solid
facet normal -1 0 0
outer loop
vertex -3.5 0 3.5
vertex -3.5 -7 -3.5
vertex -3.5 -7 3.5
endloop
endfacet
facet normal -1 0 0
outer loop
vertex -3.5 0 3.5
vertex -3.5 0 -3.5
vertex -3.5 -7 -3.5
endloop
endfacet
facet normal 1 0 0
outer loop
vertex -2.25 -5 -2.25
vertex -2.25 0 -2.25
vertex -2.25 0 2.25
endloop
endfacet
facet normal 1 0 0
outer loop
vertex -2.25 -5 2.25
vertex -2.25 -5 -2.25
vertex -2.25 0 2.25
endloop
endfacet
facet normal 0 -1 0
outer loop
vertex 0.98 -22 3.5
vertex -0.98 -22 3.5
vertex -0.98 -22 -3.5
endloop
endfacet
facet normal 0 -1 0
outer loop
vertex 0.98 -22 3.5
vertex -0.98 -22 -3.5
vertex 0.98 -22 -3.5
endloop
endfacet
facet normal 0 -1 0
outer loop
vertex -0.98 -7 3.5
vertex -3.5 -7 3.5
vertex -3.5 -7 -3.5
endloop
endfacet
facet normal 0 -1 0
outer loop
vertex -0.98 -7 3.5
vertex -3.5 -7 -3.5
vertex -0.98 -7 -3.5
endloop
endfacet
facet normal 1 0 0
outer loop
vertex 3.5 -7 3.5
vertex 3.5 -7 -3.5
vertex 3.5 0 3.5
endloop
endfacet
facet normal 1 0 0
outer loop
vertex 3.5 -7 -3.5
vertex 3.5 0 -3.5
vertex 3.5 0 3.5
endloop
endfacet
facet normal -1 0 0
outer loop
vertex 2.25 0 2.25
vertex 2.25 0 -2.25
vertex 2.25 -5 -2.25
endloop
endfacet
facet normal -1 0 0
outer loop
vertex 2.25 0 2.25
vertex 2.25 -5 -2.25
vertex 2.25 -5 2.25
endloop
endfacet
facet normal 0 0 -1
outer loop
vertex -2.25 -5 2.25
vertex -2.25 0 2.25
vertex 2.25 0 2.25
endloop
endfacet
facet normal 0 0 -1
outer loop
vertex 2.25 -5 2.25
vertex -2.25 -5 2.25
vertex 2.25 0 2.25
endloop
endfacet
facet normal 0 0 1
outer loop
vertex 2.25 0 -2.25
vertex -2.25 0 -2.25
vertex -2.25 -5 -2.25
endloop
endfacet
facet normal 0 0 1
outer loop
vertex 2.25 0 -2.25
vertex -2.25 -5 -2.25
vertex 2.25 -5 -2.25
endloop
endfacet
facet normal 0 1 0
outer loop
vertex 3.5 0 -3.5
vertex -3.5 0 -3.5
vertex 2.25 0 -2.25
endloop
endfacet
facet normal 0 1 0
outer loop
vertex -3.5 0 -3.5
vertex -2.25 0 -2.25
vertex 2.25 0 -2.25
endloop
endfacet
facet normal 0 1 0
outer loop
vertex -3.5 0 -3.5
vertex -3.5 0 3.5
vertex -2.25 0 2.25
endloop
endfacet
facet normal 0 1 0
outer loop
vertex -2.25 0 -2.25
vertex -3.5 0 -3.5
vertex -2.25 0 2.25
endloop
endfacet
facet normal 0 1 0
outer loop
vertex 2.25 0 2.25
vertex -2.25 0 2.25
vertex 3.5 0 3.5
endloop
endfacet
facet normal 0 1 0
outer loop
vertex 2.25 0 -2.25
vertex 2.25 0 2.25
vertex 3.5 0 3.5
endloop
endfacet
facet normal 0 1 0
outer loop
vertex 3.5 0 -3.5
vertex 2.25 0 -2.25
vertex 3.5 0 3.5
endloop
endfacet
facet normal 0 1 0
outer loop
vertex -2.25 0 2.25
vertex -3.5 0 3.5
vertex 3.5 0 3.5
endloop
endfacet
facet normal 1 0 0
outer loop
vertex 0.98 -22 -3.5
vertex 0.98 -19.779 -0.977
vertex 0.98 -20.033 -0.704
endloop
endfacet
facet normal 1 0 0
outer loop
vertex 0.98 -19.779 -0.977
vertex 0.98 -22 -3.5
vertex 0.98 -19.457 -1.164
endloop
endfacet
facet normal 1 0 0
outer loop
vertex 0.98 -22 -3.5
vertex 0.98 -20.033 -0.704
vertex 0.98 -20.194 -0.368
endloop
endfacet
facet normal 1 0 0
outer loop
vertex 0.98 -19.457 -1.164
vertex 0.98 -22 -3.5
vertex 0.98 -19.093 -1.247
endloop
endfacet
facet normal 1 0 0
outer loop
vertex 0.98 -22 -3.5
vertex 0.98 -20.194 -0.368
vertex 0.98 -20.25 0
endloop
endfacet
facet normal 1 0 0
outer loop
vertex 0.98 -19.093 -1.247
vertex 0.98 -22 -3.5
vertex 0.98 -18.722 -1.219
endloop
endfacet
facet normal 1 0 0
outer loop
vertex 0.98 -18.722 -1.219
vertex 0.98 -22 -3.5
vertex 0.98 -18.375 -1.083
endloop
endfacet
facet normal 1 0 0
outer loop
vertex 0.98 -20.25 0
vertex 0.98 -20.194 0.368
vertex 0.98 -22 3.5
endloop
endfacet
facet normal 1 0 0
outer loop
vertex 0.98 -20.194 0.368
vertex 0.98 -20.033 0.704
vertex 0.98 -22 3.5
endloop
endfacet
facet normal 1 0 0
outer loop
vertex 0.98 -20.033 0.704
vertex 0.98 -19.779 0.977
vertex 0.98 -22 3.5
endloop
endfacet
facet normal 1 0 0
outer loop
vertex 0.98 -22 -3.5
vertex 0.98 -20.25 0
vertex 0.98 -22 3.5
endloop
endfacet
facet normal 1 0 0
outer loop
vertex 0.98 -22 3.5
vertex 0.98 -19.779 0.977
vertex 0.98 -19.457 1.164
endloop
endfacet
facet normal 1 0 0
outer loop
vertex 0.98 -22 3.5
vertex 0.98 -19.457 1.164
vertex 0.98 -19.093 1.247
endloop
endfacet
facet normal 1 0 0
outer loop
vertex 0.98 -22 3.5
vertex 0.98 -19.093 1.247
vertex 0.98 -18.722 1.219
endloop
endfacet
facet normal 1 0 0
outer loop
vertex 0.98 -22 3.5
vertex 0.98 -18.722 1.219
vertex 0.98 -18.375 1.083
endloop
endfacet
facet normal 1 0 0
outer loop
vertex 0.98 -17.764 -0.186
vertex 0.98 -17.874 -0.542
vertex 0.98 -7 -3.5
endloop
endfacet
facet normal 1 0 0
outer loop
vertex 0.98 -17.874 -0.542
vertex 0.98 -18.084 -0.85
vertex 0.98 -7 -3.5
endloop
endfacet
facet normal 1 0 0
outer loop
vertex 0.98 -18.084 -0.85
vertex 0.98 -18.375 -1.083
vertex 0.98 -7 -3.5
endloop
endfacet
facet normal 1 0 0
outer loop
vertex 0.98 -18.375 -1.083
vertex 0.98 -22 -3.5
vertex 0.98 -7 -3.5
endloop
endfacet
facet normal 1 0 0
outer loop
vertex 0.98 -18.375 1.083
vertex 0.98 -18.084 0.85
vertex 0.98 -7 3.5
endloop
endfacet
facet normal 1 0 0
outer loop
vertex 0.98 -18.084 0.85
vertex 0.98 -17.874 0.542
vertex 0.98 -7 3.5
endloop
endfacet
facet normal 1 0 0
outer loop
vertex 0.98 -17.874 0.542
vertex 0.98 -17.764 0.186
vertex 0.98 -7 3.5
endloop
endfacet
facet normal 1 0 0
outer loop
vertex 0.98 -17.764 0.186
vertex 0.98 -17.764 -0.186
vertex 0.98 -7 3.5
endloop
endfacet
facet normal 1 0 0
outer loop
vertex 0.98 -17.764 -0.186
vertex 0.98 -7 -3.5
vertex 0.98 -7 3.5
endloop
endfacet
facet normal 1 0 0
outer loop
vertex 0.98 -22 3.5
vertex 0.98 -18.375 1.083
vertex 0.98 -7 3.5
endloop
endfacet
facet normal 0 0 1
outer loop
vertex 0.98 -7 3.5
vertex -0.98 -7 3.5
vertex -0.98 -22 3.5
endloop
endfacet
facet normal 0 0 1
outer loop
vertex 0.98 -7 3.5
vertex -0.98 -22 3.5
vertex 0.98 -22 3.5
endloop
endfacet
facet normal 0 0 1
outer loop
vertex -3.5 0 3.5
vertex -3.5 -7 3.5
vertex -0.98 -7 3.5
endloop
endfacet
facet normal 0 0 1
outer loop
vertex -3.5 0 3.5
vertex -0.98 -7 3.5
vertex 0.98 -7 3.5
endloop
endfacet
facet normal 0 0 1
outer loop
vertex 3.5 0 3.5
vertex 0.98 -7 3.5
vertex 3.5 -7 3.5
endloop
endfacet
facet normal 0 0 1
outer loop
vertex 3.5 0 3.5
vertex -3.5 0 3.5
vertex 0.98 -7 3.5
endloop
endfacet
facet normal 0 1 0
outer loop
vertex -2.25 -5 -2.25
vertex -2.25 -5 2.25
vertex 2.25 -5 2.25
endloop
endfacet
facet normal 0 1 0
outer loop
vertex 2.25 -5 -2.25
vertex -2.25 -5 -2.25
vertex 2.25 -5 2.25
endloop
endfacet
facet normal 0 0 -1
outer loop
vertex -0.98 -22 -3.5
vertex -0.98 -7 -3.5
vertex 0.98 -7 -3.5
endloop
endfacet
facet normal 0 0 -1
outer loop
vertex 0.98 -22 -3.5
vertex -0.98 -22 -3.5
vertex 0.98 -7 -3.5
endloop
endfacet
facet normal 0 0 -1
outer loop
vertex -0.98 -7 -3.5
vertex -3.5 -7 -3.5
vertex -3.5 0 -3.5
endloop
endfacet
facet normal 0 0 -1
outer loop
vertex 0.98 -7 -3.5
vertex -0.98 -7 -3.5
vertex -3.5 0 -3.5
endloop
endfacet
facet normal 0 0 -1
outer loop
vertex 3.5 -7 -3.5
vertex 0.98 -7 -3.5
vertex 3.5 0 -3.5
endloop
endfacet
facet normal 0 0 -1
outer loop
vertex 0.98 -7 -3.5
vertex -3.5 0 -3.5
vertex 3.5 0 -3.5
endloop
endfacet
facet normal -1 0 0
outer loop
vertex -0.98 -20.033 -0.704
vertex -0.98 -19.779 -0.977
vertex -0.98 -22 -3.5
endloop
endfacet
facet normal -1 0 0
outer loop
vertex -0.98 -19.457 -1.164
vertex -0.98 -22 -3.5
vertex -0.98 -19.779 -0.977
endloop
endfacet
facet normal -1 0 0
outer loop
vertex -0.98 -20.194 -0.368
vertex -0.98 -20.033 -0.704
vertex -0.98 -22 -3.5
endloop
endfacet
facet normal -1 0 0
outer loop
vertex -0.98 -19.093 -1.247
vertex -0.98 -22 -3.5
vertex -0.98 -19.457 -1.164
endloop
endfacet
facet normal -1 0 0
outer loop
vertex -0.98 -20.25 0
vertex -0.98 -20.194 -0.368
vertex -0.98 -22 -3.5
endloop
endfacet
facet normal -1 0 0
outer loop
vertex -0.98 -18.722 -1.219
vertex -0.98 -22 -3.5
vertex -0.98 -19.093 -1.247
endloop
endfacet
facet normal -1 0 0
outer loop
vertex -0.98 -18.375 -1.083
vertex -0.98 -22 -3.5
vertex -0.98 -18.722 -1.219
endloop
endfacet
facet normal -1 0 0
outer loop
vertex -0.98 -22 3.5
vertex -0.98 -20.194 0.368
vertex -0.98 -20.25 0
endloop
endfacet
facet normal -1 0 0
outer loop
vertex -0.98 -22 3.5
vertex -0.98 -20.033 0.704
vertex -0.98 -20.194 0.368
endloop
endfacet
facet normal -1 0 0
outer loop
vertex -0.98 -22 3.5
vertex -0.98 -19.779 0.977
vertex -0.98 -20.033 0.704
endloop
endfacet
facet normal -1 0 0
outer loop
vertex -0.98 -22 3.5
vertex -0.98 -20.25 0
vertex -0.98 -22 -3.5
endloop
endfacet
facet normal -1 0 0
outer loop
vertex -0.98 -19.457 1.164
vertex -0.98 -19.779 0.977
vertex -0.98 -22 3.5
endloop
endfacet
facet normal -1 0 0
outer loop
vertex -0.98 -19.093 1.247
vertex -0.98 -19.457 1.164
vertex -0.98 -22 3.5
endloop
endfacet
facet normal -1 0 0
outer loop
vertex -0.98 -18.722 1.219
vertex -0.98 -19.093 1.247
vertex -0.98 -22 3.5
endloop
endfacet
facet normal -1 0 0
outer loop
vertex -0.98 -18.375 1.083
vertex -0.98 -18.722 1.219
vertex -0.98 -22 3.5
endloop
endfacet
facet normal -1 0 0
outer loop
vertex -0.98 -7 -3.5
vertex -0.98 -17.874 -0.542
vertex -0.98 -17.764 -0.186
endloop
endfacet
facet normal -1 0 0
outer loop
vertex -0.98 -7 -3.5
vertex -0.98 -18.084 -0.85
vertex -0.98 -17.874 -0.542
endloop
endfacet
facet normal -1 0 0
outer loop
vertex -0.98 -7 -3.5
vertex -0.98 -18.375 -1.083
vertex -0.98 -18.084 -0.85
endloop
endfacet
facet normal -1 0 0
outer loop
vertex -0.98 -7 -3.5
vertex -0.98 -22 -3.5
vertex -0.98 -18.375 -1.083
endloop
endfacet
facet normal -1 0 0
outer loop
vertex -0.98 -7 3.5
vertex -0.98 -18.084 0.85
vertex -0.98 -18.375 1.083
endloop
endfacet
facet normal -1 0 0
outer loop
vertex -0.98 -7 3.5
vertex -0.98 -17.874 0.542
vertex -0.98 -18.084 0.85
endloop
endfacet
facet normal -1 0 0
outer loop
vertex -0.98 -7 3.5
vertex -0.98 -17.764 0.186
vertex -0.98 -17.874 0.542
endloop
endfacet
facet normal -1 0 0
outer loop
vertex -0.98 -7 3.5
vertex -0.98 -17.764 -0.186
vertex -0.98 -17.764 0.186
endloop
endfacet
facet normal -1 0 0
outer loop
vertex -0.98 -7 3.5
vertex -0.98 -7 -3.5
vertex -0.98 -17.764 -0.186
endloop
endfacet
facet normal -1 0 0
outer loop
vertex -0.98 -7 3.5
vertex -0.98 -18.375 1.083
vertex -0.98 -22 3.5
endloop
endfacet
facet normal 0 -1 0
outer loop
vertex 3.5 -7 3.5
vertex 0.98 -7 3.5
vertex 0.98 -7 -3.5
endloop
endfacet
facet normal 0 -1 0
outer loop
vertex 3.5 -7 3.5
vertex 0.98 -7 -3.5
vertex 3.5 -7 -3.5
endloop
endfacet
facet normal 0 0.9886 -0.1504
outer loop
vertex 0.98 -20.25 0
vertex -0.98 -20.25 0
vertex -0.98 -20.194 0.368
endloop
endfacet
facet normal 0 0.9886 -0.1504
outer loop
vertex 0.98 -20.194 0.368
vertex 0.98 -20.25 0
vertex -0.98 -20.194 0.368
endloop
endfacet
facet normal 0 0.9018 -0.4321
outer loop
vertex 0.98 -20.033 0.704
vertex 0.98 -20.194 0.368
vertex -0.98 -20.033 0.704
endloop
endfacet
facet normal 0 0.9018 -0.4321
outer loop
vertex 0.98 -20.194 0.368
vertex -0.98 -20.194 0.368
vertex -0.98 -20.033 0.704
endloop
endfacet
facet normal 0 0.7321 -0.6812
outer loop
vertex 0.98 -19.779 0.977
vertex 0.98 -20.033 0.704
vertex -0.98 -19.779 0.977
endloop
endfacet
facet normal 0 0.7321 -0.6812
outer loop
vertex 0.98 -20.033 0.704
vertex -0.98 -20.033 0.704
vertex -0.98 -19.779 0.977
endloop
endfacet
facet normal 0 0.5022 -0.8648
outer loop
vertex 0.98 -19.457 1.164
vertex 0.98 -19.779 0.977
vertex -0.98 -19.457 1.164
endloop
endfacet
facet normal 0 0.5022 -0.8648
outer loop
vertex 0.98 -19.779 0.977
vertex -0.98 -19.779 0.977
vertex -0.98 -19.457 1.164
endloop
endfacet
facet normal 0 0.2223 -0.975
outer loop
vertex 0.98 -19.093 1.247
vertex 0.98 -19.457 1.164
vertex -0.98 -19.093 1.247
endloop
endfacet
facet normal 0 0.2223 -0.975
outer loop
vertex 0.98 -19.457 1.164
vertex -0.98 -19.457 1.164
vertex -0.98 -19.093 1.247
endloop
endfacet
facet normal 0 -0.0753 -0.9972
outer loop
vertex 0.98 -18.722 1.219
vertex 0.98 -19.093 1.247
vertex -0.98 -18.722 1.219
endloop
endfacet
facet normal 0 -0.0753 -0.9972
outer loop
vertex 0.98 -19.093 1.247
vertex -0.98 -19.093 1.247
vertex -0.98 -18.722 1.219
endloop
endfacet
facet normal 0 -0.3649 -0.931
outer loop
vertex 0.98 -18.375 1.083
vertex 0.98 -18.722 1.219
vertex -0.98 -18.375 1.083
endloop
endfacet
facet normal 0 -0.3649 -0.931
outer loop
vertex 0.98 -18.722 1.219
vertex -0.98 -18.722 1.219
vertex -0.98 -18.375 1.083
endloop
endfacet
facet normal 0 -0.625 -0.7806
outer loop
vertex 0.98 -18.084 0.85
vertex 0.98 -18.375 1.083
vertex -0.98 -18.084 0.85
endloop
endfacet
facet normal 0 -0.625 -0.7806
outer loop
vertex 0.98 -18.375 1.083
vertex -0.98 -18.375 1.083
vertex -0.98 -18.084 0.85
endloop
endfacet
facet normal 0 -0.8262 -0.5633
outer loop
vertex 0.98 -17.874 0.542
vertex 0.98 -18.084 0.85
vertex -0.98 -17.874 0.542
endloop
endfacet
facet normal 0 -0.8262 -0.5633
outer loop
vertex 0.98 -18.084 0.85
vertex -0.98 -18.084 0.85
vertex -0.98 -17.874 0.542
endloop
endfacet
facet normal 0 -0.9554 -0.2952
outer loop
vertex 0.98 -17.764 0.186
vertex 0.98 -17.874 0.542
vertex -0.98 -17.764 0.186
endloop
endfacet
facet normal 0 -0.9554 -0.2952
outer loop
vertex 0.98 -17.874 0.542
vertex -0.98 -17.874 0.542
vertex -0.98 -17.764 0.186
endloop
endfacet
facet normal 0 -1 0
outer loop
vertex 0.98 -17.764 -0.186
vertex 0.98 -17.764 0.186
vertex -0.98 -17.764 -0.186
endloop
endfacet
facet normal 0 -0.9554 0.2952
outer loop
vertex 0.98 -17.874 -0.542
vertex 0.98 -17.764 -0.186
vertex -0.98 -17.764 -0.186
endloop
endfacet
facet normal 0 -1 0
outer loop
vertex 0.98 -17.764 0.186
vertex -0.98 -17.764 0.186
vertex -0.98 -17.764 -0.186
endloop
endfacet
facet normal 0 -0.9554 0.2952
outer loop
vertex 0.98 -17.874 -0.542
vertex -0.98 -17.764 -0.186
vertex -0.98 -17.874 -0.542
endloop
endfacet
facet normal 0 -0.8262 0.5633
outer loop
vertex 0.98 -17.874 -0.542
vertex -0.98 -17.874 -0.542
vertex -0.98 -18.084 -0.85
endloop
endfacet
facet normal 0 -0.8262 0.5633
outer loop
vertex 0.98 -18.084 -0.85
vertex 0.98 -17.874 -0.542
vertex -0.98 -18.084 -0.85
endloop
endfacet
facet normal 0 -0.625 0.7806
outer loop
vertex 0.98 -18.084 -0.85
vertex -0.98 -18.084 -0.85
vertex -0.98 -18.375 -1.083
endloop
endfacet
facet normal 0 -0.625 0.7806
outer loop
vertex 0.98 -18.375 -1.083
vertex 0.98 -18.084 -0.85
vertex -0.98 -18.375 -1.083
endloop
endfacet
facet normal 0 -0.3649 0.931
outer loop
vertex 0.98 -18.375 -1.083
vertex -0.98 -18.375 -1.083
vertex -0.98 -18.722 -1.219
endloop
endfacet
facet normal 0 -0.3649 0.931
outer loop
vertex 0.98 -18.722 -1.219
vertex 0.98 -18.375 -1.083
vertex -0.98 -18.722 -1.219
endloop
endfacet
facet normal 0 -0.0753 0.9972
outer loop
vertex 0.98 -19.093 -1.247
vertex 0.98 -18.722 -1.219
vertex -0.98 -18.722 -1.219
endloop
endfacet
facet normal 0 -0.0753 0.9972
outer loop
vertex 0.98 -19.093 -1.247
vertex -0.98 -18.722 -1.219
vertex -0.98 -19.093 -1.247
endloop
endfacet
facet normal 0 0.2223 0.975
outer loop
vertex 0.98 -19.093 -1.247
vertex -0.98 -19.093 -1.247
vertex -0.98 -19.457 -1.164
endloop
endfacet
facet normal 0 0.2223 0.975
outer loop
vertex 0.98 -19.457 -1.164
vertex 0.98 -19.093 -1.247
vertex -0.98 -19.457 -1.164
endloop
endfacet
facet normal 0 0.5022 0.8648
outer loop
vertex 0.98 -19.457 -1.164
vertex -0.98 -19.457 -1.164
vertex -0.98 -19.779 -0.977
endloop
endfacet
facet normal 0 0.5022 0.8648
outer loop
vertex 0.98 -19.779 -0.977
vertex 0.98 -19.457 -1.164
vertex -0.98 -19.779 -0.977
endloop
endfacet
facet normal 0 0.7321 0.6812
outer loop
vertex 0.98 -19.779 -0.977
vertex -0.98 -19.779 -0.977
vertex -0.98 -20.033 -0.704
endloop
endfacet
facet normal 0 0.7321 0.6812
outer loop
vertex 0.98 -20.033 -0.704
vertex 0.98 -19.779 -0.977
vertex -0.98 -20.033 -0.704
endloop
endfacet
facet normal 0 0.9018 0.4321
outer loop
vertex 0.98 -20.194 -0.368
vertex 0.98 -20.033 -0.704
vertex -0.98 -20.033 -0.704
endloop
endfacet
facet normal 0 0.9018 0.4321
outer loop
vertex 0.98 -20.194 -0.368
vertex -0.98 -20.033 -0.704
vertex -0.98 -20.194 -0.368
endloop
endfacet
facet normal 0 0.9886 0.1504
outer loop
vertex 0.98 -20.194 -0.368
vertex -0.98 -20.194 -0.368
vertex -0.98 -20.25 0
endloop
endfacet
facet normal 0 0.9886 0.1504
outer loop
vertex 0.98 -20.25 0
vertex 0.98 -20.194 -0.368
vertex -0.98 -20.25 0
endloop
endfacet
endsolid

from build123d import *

# Parameters (mm, degrees)
F0_W     = 7
F0_H     = 7
F0_W_2   = 4.5
F0_H_2   = 4.5
F1_DEPTH = 5
F2_W     = 7
F2_H     = 7
F3_DEPTH = 2
F4_W     = 1.960302
F4_H     = 7
F5_DEPTH = 15
F6_R     = 1.25
F7_DEPTH = 25


with BuildPart() as f1:
    # F0 (on Front) → F1 (new body)
    with BuildSketch(Plane.XZ):
        Rectangle(F0_W, F0_H)
        Rectangle(F0_W_2, F0_H_2, mode=Mode.SUBTRACT)
    extrude(amount=F1_DEPTH)

    # F2 (on face) → F3 (join)
    with BuildSketch(Plane.XZ.offset(5)):
        Rectangle(F2_W, F2_H)
    extrude(amount=F3_DEPTH)

    # F4 (on face) → F5 (join)
    with BuildSketch(Plane.XZ.offset(7)):
        Rectangle(F4_W, F4_H)
    extrude(amount=F5_DEPTH)

    # F6 (on face) → F7 (cut)
    with BuildSketch(Plane(origin=(-0.980151, 0, 0), x_dir=(0, -1, 0), z_dir=(-1, 0, 0))):
        with Locations((19, 0)):
            Circle(F6_R)
    extrude(amount=-F7_DEPTH, mode=Mode.SUBTRACT)


solid = f1.part
